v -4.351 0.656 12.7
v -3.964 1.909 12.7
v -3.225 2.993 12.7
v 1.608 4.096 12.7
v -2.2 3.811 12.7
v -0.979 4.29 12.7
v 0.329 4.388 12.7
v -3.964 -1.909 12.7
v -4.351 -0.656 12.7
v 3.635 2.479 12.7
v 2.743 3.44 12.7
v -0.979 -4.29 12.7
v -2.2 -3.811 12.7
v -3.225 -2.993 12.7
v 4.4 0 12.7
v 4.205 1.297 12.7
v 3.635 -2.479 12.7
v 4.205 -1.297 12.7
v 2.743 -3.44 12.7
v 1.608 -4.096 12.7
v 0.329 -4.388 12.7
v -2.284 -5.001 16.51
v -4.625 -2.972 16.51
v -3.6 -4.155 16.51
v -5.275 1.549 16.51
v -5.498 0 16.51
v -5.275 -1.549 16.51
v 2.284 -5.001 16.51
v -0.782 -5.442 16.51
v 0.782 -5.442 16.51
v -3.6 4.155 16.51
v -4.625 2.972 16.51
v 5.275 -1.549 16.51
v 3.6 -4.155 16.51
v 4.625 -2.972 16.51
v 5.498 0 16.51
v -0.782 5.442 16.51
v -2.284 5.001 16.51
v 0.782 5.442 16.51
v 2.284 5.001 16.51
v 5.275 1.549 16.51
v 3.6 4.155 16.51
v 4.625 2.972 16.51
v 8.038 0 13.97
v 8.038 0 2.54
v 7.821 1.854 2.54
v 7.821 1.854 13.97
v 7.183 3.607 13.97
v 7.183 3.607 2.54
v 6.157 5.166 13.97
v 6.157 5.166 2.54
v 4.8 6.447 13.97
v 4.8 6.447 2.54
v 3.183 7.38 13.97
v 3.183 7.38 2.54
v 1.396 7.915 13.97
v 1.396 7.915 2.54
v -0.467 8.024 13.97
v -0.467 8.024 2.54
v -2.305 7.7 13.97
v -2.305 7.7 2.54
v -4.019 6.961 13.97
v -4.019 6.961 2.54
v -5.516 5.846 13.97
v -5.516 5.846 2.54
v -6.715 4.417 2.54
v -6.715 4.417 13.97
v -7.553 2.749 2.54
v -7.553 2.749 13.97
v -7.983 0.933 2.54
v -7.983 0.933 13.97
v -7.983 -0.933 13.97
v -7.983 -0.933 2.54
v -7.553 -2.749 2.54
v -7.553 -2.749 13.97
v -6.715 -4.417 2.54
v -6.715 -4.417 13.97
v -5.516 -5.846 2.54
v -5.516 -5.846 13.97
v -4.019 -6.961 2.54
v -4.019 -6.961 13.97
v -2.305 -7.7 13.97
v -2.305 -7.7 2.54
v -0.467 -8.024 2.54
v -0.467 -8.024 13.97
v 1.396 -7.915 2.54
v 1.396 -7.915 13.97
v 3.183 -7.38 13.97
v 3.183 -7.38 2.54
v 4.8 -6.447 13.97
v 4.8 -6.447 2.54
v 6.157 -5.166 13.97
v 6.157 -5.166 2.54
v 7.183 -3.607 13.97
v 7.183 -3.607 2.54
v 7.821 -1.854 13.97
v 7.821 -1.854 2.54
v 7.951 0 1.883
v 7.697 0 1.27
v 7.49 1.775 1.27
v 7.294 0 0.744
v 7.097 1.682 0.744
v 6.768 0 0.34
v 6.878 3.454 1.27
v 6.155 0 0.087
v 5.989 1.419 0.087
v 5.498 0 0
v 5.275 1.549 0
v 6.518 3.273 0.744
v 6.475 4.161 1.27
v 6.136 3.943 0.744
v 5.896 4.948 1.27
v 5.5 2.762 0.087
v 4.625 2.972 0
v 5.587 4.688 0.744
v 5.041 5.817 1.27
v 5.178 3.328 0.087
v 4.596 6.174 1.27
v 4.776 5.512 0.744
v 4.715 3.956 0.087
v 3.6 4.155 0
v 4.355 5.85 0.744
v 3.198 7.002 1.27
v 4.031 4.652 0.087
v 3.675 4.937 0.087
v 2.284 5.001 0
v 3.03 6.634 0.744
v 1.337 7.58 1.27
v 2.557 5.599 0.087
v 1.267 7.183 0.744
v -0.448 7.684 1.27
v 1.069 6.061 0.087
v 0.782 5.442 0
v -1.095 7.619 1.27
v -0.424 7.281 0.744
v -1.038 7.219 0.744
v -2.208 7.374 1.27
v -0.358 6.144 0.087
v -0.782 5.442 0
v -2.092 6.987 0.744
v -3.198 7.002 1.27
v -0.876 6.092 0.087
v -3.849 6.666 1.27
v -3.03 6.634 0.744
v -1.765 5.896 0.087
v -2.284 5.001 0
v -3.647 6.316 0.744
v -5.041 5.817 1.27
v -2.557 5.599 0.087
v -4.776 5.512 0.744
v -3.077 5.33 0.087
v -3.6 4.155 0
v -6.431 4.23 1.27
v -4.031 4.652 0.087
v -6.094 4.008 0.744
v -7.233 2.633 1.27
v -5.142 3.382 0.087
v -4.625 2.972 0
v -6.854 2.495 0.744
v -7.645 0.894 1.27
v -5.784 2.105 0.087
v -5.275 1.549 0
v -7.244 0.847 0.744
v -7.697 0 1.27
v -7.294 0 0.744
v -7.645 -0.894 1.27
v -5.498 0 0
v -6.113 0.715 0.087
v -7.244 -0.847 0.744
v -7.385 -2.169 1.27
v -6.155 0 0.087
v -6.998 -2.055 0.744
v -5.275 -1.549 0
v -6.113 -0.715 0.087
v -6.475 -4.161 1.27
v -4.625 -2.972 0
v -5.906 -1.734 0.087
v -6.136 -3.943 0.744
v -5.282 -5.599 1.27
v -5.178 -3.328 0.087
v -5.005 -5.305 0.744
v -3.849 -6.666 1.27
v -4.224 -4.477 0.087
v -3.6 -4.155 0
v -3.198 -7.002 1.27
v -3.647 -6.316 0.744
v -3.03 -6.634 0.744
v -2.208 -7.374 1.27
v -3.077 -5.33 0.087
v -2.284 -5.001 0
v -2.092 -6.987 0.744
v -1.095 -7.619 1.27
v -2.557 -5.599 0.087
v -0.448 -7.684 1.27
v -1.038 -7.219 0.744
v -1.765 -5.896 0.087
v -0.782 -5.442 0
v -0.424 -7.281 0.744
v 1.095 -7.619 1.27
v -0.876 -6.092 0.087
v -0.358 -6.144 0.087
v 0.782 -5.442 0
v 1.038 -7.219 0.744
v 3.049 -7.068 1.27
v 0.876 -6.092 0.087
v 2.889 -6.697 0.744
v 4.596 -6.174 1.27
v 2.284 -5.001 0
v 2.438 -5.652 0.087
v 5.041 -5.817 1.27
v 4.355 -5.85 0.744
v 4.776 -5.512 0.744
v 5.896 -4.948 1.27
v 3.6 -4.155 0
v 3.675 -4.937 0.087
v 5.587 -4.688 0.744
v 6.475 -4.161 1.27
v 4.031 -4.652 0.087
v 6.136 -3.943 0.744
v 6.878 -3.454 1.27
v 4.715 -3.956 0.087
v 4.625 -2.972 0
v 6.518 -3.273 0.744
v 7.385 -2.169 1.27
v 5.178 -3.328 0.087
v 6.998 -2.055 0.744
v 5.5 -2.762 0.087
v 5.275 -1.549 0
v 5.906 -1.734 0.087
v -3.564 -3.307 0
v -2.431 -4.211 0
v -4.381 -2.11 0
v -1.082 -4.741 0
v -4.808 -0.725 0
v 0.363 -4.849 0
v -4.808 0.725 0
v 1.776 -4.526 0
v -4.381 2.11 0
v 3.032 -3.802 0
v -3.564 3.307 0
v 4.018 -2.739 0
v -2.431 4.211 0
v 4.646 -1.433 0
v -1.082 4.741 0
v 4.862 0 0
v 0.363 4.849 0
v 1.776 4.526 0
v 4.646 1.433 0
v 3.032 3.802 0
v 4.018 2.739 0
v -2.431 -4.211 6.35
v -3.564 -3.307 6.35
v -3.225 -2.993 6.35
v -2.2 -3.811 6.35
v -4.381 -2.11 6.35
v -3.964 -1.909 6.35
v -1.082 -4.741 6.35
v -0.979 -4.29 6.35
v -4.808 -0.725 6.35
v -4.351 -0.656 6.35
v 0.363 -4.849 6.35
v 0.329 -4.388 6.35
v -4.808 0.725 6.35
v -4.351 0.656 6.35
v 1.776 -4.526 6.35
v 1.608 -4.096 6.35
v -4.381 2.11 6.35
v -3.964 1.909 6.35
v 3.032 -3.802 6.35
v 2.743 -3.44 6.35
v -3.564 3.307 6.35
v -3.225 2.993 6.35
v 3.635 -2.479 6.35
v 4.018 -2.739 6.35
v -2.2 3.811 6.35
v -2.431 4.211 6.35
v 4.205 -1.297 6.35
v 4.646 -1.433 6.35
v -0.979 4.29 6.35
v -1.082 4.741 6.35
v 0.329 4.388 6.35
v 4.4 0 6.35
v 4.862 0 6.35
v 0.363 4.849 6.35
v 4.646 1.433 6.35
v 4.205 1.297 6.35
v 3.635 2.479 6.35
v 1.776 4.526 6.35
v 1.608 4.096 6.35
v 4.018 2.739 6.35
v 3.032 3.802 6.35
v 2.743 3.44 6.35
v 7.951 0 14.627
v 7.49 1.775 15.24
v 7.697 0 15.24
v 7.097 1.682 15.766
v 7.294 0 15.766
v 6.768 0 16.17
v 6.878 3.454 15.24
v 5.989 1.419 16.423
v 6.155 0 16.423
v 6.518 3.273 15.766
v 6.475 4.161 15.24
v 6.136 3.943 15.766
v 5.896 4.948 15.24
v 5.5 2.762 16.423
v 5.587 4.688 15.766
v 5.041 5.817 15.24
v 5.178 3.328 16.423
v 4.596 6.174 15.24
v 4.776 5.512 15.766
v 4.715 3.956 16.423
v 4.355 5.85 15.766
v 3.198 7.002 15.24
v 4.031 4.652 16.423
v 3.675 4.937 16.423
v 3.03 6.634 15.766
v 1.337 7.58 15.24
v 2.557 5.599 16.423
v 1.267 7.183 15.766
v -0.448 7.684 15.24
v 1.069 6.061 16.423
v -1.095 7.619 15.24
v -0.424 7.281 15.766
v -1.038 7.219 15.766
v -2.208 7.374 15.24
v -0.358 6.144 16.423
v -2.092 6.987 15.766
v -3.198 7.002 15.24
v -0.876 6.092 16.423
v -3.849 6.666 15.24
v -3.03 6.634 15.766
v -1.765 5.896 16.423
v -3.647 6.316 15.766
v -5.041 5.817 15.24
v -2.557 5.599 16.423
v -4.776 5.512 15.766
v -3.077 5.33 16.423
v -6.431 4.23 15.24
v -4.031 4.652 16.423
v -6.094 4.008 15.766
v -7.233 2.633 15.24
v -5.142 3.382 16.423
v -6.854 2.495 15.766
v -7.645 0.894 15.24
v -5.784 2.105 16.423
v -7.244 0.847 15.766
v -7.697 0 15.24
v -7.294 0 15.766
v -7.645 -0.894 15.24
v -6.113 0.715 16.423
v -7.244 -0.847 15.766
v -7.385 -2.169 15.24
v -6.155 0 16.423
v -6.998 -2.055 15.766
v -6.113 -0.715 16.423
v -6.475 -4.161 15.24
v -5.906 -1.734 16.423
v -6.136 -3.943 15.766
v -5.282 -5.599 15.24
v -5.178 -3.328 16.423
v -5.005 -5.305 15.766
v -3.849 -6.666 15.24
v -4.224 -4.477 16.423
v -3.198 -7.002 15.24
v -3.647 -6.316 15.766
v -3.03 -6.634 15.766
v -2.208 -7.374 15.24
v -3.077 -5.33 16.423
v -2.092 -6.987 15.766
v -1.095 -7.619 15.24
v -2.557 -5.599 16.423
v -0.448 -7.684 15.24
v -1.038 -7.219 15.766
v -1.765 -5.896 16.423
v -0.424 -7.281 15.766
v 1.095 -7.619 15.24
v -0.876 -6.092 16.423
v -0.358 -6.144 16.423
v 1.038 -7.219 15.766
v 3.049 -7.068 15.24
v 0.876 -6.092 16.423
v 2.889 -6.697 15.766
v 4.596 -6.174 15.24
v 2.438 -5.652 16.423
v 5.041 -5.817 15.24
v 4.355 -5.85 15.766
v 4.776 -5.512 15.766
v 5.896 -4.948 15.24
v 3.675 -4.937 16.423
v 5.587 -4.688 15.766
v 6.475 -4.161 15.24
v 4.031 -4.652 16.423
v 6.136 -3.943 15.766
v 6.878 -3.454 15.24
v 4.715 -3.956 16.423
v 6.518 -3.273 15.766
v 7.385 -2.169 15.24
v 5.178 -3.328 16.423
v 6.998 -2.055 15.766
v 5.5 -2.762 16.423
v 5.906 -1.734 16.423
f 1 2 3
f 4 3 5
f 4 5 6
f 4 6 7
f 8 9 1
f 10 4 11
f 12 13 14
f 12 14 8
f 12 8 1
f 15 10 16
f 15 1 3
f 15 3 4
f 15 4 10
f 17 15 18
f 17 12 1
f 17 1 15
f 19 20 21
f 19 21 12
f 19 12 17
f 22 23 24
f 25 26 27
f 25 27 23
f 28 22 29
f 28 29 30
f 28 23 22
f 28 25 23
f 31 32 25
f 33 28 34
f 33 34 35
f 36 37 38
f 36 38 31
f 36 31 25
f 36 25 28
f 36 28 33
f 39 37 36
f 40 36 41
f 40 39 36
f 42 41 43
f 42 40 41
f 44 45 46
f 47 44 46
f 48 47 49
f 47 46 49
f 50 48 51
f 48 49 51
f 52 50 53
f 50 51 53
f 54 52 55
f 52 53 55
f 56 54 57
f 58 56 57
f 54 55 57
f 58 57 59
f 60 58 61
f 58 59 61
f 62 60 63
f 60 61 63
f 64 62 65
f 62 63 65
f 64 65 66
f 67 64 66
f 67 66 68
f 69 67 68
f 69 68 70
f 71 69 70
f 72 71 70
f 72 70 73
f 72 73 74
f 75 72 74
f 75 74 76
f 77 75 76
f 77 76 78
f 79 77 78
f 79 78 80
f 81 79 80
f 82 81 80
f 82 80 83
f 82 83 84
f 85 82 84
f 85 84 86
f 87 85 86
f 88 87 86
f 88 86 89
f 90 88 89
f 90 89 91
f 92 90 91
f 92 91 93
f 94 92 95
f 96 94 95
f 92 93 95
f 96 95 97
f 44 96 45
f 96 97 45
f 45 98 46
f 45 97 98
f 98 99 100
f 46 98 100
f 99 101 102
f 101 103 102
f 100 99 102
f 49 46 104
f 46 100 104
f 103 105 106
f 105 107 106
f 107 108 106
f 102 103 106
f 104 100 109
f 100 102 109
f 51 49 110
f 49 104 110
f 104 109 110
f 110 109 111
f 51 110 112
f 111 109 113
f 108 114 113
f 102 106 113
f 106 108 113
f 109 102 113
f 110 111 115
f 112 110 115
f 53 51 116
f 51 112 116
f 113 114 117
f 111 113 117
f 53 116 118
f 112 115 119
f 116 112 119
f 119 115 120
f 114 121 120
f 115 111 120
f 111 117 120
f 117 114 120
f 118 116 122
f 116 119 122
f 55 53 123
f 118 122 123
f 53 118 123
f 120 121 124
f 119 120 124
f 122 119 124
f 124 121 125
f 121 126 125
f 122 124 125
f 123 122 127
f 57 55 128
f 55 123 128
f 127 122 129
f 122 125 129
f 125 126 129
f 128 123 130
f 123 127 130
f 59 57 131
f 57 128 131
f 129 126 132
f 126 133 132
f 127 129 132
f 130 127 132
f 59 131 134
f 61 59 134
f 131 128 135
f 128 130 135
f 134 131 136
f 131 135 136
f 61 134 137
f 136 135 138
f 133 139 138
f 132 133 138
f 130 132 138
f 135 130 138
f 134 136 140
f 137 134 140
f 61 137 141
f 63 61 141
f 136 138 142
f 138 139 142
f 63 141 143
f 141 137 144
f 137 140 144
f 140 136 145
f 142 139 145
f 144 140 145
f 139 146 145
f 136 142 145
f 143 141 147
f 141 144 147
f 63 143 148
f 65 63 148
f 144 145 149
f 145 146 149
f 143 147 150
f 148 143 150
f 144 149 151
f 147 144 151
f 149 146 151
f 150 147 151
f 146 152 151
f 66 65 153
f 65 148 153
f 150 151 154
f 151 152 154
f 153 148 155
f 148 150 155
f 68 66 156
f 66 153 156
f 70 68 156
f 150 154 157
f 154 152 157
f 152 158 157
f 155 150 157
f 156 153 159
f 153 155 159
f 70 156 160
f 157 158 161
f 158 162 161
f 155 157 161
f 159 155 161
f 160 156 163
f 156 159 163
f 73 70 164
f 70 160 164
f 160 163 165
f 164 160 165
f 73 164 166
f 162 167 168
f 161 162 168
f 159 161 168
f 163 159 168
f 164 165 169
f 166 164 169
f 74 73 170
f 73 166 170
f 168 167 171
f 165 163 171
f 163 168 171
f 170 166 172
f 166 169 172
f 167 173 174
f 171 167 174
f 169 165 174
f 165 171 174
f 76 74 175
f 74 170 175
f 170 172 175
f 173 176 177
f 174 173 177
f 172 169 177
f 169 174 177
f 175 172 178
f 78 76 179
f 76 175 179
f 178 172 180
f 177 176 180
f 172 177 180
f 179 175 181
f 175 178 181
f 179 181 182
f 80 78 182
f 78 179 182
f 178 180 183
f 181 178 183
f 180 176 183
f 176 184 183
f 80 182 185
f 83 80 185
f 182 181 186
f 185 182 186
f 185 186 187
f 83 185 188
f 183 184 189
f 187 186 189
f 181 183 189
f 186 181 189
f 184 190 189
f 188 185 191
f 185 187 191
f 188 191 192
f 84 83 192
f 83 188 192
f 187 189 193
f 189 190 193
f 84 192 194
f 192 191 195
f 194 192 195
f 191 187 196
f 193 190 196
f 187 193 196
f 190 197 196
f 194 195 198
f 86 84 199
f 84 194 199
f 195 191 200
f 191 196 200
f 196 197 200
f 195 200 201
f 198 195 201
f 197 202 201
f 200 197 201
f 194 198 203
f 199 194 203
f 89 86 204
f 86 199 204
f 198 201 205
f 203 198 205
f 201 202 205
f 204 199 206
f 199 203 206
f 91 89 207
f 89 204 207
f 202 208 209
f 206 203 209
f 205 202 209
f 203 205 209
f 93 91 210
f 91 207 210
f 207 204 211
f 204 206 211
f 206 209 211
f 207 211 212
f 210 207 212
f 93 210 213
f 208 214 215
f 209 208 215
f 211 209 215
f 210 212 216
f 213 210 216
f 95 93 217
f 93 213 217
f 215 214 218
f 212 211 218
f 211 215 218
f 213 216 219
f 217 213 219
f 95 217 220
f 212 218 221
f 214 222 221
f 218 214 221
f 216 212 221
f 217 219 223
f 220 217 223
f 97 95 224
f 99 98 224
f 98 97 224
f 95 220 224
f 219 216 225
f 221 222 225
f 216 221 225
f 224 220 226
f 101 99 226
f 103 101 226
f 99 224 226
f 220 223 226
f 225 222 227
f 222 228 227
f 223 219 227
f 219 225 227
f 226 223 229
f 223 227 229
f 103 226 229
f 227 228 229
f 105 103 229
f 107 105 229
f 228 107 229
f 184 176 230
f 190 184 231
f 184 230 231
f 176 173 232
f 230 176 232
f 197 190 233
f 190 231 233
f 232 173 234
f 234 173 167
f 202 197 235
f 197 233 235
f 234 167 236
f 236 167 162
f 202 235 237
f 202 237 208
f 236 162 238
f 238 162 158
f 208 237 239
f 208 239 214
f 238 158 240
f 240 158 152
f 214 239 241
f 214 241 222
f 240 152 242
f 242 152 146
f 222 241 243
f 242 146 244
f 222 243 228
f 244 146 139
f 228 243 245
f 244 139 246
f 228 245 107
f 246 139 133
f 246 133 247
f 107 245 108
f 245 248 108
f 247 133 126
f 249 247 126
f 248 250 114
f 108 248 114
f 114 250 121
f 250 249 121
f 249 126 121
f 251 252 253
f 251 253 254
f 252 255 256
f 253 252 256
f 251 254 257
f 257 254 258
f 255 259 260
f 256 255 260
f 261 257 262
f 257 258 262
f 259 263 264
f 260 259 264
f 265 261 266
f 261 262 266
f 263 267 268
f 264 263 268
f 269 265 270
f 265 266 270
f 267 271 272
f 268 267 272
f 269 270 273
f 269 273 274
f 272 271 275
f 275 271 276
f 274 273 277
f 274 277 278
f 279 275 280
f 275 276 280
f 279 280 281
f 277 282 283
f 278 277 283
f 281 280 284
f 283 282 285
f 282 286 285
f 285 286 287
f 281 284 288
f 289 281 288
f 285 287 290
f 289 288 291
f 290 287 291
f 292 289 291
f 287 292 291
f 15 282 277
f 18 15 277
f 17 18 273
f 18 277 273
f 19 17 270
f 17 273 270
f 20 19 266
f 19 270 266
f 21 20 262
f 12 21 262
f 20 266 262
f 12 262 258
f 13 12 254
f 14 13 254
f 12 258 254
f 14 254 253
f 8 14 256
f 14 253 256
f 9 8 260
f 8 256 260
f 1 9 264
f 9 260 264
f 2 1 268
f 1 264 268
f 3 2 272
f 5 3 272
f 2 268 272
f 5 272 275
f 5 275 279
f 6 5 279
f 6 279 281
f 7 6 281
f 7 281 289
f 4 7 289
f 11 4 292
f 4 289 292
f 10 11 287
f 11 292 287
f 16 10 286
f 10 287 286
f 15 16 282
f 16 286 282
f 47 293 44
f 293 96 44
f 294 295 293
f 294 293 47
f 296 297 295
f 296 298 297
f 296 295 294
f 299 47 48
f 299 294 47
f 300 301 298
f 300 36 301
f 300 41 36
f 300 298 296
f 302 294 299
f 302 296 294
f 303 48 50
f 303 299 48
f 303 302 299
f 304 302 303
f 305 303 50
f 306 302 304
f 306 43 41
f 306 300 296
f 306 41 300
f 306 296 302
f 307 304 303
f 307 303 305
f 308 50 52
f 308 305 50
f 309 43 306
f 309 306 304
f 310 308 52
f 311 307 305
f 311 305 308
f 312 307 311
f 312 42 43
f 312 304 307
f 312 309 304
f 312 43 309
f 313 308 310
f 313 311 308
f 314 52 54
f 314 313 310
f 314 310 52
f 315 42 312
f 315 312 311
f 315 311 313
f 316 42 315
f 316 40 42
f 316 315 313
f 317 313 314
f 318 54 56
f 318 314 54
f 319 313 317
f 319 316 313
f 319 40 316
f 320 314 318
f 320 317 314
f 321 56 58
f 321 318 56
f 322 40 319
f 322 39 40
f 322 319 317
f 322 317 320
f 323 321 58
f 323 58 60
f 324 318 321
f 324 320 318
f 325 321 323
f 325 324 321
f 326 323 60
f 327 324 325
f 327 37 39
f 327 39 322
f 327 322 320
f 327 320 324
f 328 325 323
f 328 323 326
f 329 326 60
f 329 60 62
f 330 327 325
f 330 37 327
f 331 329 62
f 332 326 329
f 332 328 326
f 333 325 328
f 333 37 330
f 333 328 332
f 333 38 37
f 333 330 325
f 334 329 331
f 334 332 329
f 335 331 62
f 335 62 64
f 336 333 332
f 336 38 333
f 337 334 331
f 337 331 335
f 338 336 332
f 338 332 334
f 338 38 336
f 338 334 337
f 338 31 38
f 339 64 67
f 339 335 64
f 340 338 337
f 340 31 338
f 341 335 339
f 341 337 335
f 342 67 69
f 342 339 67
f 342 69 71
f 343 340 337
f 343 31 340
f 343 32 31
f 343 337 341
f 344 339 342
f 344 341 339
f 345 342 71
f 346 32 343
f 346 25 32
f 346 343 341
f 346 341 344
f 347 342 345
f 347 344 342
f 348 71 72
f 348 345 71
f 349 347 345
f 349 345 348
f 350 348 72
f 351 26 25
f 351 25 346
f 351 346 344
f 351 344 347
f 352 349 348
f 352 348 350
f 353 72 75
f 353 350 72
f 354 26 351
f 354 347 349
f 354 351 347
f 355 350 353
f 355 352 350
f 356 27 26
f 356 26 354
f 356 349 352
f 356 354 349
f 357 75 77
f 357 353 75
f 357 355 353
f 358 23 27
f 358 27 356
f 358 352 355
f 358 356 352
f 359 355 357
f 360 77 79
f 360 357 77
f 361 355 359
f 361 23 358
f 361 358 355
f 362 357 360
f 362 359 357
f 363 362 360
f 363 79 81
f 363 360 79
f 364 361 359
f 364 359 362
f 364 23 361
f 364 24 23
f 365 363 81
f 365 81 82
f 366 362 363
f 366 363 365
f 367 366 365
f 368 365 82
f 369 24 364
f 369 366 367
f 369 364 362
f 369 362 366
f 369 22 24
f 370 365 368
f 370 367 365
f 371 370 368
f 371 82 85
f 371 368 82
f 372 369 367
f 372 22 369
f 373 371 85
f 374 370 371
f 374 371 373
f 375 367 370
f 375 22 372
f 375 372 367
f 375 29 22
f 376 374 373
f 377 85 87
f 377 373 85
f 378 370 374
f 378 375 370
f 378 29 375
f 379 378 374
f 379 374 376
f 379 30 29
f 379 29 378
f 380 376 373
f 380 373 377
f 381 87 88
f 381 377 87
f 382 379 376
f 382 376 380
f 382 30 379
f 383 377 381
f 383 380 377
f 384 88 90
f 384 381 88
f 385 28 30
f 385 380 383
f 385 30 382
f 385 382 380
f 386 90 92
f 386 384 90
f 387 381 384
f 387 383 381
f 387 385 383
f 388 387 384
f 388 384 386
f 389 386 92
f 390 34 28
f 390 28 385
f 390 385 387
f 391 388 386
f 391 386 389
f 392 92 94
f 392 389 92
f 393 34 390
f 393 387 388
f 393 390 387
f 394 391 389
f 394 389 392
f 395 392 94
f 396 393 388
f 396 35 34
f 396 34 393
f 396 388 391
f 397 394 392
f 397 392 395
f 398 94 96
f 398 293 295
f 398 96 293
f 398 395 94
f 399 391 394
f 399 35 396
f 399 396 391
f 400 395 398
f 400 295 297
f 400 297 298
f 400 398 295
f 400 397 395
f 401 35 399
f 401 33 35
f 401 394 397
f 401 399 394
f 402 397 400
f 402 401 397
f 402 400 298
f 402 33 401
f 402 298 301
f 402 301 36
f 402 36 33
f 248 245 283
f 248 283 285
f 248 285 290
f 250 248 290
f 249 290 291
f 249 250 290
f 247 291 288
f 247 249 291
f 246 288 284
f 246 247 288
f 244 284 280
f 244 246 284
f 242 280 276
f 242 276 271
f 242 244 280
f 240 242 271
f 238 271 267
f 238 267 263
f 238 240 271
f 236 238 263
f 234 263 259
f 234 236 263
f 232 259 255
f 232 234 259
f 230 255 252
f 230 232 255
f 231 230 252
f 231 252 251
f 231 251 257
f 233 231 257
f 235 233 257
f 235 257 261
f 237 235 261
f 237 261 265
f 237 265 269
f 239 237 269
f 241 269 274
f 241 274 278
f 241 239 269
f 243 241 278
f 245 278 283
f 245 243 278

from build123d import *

# Parameters (mm, degrees)
F0_R     = 8.0375
F0_R_2   = 4.8625
F1_DEPTH = 6.35
F2_R     = 8.0375
F3_DEPTH = 10.16
F4_R     = 2.54
F5_R     = 4.4
F6_DEPTH = 6.35
F7_R     = 2.54


with BuildPart() as f1:
    # F0 (on Top) → F1 (new body)
    with BuildSketch(Plane.XY):
        Circle(F0_R)
        Circle(F0_R_2, mode=Mode.SUBTRACT)
    extrude(amount=F1_DEPTH)

    # F2 (on face) → F3 (join)
    with BuildSketch(Plane.XY.offset(6.35)):
        Circle(F2_R)
    extrude(amount=F3_DEPTH)

    # F4
    f4_edges = [f1.edges().sort_by_distance(p)[0] for p in [
        (-8.0375, 0, 0),
    ]]
    fillet(f4_edges, radius=F4_R)

    # F5 (on face) → F6 (cut)
    with BuildSketch(Plane(origin=(0, 0, 6.35), x_dir=(1, 0, 0), z_dir=(0, 0, -1))):
        Circle(F5_R)
    extrude(amount=-F6_DEPTH, mode=Mode.SUBTRACT)

    # F7
    f7_edges = [f1.edges().sort_by_distance(p)[0] for p in [
        (-8.0375, 0, 16.51),
    ]]
    fillet(f7_edges, radius=F7_R)


solid = f1.part
